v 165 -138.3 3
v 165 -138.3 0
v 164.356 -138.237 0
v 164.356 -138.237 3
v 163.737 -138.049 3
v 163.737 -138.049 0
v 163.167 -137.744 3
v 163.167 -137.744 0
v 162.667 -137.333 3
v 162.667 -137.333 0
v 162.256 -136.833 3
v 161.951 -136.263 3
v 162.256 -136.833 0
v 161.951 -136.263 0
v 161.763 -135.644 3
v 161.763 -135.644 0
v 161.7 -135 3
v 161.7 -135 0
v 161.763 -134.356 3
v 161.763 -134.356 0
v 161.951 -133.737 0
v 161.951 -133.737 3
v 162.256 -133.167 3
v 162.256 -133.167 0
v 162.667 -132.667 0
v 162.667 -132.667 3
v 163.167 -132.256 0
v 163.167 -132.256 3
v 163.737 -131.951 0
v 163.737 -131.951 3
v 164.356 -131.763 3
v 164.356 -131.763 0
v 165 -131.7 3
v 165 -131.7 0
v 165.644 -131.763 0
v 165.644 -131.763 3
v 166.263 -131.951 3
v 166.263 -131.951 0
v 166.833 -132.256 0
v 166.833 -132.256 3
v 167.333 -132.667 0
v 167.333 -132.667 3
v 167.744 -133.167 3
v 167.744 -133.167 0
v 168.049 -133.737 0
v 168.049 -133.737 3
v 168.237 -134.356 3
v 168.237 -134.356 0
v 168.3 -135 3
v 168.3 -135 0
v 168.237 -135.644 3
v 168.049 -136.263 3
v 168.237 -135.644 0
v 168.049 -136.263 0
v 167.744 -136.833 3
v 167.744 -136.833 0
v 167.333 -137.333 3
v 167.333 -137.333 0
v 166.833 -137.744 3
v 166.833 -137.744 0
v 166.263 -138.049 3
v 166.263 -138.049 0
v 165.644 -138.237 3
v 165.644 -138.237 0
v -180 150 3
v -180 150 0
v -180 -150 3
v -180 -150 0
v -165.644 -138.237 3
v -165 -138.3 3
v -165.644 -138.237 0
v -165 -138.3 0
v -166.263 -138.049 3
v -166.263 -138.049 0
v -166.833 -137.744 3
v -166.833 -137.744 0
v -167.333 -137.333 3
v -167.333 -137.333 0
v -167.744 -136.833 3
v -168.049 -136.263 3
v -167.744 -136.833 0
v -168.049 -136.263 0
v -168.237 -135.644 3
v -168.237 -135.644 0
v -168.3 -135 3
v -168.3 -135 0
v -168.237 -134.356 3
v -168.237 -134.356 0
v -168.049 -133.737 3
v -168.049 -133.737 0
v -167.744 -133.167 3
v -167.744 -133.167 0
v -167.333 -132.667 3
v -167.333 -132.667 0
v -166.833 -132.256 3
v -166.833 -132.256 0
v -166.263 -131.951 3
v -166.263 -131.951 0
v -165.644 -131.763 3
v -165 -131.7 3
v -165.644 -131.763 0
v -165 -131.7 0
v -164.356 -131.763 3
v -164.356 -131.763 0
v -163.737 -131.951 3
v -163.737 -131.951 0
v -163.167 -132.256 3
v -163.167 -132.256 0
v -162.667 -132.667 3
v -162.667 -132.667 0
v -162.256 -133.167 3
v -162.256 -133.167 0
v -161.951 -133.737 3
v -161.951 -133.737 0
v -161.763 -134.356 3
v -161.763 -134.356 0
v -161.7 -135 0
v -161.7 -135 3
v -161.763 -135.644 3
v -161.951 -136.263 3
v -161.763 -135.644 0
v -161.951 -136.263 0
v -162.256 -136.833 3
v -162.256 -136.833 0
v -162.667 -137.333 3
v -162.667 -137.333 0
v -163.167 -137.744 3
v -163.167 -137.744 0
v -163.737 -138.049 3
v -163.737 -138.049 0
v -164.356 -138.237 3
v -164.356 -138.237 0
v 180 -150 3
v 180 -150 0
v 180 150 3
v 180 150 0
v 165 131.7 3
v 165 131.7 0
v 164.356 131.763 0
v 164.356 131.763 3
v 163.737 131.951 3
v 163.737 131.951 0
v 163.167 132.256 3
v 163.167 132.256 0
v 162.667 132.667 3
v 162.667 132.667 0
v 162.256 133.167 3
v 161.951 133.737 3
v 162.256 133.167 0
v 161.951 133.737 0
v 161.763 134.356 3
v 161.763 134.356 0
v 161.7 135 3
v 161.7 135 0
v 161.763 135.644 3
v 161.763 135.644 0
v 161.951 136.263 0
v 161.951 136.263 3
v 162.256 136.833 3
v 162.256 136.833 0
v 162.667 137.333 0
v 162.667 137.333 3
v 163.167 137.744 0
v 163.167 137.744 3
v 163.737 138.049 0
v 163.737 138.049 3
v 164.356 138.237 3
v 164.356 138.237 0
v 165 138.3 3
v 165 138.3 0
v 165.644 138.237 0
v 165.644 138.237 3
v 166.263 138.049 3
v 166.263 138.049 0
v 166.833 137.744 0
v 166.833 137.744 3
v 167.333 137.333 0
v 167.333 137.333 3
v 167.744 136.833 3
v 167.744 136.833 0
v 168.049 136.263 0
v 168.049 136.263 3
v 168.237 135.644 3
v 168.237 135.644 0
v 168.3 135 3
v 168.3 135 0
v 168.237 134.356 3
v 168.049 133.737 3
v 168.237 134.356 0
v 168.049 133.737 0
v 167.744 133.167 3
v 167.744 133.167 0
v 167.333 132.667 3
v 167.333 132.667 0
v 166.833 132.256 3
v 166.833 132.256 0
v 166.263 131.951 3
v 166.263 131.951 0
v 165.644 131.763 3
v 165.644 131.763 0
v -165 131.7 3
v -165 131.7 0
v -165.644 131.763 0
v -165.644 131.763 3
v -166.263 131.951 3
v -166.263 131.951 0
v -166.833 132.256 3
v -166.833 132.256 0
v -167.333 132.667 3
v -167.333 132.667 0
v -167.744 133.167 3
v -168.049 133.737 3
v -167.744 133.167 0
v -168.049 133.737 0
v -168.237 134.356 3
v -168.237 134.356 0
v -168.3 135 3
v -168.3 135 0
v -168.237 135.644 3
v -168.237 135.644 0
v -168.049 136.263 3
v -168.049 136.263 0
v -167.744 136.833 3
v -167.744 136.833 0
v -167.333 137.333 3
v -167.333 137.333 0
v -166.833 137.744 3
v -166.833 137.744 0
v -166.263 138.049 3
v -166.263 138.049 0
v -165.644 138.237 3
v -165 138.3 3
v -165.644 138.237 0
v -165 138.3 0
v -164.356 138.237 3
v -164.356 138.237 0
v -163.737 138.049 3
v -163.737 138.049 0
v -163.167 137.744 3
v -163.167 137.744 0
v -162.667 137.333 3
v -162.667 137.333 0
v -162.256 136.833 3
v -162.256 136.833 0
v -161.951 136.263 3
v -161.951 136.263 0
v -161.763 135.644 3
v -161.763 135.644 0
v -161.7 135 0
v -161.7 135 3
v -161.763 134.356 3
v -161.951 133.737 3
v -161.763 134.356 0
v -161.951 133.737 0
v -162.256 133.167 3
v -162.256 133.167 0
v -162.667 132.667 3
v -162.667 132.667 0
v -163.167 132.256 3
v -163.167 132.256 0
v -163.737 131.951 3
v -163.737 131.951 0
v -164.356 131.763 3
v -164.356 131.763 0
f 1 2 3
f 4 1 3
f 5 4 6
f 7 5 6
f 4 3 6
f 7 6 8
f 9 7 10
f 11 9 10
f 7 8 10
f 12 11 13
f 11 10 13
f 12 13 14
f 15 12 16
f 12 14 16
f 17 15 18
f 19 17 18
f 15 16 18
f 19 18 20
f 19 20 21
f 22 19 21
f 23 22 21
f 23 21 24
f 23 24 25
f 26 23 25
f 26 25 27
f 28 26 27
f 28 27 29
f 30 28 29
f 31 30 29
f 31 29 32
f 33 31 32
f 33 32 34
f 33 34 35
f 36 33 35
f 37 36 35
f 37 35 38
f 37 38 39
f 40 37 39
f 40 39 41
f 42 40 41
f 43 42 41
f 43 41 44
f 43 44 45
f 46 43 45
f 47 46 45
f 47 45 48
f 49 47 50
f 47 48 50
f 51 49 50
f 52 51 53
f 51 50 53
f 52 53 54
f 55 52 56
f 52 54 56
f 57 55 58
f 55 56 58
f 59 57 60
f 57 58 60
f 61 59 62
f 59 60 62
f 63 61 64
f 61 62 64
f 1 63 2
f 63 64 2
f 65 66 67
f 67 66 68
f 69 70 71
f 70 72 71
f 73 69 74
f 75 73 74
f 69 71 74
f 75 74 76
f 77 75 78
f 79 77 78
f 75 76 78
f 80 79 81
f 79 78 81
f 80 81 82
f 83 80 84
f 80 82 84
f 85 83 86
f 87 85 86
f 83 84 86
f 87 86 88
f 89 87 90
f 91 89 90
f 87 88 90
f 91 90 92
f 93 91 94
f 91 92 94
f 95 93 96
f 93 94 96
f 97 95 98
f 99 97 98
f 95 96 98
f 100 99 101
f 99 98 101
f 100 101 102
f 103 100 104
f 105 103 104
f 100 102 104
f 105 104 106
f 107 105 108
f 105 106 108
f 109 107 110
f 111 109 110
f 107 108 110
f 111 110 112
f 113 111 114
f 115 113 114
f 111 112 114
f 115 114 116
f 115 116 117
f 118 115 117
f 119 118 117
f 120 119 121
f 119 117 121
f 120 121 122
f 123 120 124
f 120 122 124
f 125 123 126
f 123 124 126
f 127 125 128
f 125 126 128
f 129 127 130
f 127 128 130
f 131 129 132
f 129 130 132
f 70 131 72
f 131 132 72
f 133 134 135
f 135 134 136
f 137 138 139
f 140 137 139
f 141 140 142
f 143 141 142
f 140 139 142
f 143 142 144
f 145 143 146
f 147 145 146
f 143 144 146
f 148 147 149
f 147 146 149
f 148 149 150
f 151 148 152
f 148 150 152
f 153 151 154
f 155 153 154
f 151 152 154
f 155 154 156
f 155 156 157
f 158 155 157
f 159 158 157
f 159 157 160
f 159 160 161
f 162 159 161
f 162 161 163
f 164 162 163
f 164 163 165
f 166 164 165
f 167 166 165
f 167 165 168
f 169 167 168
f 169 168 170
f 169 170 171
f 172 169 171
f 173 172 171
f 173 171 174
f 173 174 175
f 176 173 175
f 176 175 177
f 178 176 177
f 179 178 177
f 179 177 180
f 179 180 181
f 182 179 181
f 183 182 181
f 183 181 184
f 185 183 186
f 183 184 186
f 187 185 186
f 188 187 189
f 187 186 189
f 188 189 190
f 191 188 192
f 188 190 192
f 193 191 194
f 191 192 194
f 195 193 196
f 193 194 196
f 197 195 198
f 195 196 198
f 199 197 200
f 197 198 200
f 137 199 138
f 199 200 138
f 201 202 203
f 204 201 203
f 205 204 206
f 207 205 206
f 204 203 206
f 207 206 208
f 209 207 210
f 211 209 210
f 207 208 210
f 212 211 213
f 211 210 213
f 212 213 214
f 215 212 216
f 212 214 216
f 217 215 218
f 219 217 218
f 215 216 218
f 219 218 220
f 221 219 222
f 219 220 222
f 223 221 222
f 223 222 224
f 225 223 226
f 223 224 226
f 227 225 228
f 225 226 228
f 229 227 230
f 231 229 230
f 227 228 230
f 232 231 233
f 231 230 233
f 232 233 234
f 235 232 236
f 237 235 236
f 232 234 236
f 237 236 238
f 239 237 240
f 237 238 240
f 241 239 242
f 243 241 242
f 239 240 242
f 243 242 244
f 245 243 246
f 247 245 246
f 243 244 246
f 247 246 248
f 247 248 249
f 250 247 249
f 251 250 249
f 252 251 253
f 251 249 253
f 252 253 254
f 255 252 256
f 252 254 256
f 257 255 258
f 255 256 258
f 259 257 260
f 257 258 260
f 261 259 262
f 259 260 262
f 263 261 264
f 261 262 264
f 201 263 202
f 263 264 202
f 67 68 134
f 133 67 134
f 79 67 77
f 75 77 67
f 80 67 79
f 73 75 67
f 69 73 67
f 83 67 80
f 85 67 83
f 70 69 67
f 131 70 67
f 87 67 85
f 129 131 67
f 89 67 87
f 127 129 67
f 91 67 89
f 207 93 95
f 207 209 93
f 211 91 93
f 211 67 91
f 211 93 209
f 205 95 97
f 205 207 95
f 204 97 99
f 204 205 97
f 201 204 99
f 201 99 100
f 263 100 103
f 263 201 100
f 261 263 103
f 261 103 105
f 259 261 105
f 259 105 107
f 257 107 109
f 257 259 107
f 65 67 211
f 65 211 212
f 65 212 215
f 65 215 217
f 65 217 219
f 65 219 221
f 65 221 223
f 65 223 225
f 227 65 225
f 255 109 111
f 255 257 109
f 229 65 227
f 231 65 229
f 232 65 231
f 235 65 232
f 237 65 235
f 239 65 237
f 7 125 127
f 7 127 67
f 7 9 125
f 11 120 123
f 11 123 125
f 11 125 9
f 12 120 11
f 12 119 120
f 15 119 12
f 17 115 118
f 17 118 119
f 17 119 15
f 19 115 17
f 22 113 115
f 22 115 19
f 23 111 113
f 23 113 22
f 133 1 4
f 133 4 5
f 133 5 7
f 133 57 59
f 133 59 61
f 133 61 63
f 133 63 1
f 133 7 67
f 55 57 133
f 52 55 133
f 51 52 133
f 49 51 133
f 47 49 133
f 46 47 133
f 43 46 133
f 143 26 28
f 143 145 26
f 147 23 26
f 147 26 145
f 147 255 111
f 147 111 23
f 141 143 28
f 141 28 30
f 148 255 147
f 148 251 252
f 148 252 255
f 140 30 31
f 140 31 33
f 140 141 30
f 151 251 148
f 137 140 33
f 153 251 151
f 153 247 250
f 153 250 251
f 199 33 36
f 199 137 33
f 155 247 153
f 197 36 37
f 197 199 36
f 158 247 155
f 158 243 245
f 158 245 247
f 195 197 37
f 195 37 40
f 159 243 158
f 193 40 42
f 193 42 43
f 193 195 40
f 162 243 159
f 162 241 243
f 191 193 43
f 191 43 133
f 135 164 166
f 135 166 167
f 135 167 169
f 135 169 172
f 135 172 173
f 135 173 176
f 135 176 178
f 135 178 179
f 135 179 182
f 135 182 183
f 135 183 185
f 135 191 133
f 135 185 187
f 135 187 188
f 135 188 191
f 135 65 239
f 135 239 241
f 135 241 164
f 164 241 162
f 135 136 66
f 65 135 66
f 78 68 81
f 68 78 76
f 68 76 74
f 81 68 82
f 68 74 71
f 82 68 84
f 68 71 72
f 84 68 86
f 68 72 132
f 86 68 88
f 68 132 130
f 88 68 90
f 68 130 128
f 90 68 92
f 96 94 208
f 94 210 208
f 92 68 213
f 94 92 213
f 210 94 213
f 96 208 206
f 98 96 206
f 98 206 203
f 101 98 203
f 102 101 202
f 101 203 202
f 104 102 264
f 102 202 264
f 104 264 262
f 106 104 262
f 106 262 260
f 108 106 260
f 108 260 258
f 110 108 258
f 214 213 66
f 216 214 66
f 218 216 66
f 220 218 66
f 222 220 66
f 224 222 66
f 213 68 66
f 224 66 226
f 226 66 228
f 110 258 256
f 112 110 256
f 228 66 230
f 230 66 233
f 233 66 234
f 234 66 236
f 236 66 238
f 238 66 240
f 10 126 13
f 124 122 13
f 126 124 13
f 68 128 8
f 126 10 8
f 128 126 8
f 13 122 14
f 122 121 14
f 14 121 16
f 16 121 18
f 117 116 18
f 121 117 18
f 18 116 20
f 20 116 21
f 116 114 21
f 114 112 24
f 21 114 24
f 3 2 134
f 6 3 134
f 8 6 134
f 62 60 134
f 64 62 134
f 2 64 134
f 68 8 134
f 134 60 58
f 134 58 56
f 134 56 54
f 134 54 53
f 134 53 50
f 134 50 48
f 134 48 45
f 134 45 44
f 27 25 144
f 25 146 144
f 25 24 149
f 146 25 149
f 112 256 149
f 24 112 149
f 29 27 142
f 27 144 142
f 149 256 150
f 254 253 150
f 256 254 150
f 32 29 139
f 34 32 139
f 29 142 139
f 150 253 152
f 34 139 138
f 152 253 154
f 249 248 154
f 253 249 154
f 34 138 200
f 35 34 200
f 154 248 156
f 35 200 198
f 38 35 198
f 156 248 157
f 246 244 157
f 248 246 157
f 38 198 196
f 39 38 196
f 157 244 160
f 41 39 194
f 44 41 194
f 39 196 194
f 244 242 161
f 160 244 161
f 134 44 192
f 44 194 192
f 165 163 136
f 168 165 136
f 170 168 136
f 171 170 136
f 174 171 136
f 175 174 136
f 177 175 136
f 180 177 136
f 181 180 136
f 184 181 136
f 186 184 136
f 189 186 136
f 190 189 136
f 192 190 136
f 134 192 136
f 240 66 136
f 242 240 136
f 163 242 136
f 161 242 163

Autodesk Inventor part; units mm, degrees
ref_plane "YZ Plane" through (0, 0, 0) normal (1, 0, 0) x (0, 1, 0)
ref_plane "XZ Plane" through (0, 0, 0) normal (0, 1, 0) x (-1, 0, 0)
ref_plane "XY Plane" through (0, 0, 0) normal (0, 0, 1) x (1, 0, 0)
sketch "スケッチ2" plane through (0, 0, 0) normal (0, 0, 1) x (1, 0, 0)
  line L0 (180, 150) -> (-180, 150)
  line L1 (-180, 150) -> (-180, -150)
  line L2 (-180, -150) -> (180, -150)
  line L3 (180, -150) -> (180, 150)
  line L4 (180, 150) -> (-180, -150) construction
  line L5 (-180, 150) -> (180, -150) construction
  point P0 (0, 0)
  dimension "d0" = 360
  dimension "d1" = 300
extrude "押し出し1" add sketch "スケッチ2" along normal blind 3
sketch "スケッチ3" plane through (0, 0, 3) normal (0, 0, 1) x (1, 0, 0)
  line L0 (-180, 150) -> (-180, -150) construction
  line L1 (-180, -150) -> (180, -150) construction
  line L2 (180, -150) -> (180, 150) construction
  line L3 (180, 150) -> (-180, 150) construction
  line L4 (165, 135) -> (-165, 135) construction
  line L5 (-165, 135) -> (-165, -135) construction
  line L6 (-165, -135) -> (165, -135) construction
  line L7 (165, -135) -> (165, 135) construction
  line L8 (165, 135) -> (-165, -135) construction
  line L9 (-165, 135) -> (165, -135) construction
  point P0 (0, 0)
  dimension "d4" = 15
  dimension "d5" = 15
hole "穴1" at (-165, 135, 3) at (165, 135, 3) at (165, -135, 3) at (-165, -135, 3) direction (0, 0, -1) diameter 6.6 end through all
equation "\"d5\" = d4"
properties part number "front_panel"
